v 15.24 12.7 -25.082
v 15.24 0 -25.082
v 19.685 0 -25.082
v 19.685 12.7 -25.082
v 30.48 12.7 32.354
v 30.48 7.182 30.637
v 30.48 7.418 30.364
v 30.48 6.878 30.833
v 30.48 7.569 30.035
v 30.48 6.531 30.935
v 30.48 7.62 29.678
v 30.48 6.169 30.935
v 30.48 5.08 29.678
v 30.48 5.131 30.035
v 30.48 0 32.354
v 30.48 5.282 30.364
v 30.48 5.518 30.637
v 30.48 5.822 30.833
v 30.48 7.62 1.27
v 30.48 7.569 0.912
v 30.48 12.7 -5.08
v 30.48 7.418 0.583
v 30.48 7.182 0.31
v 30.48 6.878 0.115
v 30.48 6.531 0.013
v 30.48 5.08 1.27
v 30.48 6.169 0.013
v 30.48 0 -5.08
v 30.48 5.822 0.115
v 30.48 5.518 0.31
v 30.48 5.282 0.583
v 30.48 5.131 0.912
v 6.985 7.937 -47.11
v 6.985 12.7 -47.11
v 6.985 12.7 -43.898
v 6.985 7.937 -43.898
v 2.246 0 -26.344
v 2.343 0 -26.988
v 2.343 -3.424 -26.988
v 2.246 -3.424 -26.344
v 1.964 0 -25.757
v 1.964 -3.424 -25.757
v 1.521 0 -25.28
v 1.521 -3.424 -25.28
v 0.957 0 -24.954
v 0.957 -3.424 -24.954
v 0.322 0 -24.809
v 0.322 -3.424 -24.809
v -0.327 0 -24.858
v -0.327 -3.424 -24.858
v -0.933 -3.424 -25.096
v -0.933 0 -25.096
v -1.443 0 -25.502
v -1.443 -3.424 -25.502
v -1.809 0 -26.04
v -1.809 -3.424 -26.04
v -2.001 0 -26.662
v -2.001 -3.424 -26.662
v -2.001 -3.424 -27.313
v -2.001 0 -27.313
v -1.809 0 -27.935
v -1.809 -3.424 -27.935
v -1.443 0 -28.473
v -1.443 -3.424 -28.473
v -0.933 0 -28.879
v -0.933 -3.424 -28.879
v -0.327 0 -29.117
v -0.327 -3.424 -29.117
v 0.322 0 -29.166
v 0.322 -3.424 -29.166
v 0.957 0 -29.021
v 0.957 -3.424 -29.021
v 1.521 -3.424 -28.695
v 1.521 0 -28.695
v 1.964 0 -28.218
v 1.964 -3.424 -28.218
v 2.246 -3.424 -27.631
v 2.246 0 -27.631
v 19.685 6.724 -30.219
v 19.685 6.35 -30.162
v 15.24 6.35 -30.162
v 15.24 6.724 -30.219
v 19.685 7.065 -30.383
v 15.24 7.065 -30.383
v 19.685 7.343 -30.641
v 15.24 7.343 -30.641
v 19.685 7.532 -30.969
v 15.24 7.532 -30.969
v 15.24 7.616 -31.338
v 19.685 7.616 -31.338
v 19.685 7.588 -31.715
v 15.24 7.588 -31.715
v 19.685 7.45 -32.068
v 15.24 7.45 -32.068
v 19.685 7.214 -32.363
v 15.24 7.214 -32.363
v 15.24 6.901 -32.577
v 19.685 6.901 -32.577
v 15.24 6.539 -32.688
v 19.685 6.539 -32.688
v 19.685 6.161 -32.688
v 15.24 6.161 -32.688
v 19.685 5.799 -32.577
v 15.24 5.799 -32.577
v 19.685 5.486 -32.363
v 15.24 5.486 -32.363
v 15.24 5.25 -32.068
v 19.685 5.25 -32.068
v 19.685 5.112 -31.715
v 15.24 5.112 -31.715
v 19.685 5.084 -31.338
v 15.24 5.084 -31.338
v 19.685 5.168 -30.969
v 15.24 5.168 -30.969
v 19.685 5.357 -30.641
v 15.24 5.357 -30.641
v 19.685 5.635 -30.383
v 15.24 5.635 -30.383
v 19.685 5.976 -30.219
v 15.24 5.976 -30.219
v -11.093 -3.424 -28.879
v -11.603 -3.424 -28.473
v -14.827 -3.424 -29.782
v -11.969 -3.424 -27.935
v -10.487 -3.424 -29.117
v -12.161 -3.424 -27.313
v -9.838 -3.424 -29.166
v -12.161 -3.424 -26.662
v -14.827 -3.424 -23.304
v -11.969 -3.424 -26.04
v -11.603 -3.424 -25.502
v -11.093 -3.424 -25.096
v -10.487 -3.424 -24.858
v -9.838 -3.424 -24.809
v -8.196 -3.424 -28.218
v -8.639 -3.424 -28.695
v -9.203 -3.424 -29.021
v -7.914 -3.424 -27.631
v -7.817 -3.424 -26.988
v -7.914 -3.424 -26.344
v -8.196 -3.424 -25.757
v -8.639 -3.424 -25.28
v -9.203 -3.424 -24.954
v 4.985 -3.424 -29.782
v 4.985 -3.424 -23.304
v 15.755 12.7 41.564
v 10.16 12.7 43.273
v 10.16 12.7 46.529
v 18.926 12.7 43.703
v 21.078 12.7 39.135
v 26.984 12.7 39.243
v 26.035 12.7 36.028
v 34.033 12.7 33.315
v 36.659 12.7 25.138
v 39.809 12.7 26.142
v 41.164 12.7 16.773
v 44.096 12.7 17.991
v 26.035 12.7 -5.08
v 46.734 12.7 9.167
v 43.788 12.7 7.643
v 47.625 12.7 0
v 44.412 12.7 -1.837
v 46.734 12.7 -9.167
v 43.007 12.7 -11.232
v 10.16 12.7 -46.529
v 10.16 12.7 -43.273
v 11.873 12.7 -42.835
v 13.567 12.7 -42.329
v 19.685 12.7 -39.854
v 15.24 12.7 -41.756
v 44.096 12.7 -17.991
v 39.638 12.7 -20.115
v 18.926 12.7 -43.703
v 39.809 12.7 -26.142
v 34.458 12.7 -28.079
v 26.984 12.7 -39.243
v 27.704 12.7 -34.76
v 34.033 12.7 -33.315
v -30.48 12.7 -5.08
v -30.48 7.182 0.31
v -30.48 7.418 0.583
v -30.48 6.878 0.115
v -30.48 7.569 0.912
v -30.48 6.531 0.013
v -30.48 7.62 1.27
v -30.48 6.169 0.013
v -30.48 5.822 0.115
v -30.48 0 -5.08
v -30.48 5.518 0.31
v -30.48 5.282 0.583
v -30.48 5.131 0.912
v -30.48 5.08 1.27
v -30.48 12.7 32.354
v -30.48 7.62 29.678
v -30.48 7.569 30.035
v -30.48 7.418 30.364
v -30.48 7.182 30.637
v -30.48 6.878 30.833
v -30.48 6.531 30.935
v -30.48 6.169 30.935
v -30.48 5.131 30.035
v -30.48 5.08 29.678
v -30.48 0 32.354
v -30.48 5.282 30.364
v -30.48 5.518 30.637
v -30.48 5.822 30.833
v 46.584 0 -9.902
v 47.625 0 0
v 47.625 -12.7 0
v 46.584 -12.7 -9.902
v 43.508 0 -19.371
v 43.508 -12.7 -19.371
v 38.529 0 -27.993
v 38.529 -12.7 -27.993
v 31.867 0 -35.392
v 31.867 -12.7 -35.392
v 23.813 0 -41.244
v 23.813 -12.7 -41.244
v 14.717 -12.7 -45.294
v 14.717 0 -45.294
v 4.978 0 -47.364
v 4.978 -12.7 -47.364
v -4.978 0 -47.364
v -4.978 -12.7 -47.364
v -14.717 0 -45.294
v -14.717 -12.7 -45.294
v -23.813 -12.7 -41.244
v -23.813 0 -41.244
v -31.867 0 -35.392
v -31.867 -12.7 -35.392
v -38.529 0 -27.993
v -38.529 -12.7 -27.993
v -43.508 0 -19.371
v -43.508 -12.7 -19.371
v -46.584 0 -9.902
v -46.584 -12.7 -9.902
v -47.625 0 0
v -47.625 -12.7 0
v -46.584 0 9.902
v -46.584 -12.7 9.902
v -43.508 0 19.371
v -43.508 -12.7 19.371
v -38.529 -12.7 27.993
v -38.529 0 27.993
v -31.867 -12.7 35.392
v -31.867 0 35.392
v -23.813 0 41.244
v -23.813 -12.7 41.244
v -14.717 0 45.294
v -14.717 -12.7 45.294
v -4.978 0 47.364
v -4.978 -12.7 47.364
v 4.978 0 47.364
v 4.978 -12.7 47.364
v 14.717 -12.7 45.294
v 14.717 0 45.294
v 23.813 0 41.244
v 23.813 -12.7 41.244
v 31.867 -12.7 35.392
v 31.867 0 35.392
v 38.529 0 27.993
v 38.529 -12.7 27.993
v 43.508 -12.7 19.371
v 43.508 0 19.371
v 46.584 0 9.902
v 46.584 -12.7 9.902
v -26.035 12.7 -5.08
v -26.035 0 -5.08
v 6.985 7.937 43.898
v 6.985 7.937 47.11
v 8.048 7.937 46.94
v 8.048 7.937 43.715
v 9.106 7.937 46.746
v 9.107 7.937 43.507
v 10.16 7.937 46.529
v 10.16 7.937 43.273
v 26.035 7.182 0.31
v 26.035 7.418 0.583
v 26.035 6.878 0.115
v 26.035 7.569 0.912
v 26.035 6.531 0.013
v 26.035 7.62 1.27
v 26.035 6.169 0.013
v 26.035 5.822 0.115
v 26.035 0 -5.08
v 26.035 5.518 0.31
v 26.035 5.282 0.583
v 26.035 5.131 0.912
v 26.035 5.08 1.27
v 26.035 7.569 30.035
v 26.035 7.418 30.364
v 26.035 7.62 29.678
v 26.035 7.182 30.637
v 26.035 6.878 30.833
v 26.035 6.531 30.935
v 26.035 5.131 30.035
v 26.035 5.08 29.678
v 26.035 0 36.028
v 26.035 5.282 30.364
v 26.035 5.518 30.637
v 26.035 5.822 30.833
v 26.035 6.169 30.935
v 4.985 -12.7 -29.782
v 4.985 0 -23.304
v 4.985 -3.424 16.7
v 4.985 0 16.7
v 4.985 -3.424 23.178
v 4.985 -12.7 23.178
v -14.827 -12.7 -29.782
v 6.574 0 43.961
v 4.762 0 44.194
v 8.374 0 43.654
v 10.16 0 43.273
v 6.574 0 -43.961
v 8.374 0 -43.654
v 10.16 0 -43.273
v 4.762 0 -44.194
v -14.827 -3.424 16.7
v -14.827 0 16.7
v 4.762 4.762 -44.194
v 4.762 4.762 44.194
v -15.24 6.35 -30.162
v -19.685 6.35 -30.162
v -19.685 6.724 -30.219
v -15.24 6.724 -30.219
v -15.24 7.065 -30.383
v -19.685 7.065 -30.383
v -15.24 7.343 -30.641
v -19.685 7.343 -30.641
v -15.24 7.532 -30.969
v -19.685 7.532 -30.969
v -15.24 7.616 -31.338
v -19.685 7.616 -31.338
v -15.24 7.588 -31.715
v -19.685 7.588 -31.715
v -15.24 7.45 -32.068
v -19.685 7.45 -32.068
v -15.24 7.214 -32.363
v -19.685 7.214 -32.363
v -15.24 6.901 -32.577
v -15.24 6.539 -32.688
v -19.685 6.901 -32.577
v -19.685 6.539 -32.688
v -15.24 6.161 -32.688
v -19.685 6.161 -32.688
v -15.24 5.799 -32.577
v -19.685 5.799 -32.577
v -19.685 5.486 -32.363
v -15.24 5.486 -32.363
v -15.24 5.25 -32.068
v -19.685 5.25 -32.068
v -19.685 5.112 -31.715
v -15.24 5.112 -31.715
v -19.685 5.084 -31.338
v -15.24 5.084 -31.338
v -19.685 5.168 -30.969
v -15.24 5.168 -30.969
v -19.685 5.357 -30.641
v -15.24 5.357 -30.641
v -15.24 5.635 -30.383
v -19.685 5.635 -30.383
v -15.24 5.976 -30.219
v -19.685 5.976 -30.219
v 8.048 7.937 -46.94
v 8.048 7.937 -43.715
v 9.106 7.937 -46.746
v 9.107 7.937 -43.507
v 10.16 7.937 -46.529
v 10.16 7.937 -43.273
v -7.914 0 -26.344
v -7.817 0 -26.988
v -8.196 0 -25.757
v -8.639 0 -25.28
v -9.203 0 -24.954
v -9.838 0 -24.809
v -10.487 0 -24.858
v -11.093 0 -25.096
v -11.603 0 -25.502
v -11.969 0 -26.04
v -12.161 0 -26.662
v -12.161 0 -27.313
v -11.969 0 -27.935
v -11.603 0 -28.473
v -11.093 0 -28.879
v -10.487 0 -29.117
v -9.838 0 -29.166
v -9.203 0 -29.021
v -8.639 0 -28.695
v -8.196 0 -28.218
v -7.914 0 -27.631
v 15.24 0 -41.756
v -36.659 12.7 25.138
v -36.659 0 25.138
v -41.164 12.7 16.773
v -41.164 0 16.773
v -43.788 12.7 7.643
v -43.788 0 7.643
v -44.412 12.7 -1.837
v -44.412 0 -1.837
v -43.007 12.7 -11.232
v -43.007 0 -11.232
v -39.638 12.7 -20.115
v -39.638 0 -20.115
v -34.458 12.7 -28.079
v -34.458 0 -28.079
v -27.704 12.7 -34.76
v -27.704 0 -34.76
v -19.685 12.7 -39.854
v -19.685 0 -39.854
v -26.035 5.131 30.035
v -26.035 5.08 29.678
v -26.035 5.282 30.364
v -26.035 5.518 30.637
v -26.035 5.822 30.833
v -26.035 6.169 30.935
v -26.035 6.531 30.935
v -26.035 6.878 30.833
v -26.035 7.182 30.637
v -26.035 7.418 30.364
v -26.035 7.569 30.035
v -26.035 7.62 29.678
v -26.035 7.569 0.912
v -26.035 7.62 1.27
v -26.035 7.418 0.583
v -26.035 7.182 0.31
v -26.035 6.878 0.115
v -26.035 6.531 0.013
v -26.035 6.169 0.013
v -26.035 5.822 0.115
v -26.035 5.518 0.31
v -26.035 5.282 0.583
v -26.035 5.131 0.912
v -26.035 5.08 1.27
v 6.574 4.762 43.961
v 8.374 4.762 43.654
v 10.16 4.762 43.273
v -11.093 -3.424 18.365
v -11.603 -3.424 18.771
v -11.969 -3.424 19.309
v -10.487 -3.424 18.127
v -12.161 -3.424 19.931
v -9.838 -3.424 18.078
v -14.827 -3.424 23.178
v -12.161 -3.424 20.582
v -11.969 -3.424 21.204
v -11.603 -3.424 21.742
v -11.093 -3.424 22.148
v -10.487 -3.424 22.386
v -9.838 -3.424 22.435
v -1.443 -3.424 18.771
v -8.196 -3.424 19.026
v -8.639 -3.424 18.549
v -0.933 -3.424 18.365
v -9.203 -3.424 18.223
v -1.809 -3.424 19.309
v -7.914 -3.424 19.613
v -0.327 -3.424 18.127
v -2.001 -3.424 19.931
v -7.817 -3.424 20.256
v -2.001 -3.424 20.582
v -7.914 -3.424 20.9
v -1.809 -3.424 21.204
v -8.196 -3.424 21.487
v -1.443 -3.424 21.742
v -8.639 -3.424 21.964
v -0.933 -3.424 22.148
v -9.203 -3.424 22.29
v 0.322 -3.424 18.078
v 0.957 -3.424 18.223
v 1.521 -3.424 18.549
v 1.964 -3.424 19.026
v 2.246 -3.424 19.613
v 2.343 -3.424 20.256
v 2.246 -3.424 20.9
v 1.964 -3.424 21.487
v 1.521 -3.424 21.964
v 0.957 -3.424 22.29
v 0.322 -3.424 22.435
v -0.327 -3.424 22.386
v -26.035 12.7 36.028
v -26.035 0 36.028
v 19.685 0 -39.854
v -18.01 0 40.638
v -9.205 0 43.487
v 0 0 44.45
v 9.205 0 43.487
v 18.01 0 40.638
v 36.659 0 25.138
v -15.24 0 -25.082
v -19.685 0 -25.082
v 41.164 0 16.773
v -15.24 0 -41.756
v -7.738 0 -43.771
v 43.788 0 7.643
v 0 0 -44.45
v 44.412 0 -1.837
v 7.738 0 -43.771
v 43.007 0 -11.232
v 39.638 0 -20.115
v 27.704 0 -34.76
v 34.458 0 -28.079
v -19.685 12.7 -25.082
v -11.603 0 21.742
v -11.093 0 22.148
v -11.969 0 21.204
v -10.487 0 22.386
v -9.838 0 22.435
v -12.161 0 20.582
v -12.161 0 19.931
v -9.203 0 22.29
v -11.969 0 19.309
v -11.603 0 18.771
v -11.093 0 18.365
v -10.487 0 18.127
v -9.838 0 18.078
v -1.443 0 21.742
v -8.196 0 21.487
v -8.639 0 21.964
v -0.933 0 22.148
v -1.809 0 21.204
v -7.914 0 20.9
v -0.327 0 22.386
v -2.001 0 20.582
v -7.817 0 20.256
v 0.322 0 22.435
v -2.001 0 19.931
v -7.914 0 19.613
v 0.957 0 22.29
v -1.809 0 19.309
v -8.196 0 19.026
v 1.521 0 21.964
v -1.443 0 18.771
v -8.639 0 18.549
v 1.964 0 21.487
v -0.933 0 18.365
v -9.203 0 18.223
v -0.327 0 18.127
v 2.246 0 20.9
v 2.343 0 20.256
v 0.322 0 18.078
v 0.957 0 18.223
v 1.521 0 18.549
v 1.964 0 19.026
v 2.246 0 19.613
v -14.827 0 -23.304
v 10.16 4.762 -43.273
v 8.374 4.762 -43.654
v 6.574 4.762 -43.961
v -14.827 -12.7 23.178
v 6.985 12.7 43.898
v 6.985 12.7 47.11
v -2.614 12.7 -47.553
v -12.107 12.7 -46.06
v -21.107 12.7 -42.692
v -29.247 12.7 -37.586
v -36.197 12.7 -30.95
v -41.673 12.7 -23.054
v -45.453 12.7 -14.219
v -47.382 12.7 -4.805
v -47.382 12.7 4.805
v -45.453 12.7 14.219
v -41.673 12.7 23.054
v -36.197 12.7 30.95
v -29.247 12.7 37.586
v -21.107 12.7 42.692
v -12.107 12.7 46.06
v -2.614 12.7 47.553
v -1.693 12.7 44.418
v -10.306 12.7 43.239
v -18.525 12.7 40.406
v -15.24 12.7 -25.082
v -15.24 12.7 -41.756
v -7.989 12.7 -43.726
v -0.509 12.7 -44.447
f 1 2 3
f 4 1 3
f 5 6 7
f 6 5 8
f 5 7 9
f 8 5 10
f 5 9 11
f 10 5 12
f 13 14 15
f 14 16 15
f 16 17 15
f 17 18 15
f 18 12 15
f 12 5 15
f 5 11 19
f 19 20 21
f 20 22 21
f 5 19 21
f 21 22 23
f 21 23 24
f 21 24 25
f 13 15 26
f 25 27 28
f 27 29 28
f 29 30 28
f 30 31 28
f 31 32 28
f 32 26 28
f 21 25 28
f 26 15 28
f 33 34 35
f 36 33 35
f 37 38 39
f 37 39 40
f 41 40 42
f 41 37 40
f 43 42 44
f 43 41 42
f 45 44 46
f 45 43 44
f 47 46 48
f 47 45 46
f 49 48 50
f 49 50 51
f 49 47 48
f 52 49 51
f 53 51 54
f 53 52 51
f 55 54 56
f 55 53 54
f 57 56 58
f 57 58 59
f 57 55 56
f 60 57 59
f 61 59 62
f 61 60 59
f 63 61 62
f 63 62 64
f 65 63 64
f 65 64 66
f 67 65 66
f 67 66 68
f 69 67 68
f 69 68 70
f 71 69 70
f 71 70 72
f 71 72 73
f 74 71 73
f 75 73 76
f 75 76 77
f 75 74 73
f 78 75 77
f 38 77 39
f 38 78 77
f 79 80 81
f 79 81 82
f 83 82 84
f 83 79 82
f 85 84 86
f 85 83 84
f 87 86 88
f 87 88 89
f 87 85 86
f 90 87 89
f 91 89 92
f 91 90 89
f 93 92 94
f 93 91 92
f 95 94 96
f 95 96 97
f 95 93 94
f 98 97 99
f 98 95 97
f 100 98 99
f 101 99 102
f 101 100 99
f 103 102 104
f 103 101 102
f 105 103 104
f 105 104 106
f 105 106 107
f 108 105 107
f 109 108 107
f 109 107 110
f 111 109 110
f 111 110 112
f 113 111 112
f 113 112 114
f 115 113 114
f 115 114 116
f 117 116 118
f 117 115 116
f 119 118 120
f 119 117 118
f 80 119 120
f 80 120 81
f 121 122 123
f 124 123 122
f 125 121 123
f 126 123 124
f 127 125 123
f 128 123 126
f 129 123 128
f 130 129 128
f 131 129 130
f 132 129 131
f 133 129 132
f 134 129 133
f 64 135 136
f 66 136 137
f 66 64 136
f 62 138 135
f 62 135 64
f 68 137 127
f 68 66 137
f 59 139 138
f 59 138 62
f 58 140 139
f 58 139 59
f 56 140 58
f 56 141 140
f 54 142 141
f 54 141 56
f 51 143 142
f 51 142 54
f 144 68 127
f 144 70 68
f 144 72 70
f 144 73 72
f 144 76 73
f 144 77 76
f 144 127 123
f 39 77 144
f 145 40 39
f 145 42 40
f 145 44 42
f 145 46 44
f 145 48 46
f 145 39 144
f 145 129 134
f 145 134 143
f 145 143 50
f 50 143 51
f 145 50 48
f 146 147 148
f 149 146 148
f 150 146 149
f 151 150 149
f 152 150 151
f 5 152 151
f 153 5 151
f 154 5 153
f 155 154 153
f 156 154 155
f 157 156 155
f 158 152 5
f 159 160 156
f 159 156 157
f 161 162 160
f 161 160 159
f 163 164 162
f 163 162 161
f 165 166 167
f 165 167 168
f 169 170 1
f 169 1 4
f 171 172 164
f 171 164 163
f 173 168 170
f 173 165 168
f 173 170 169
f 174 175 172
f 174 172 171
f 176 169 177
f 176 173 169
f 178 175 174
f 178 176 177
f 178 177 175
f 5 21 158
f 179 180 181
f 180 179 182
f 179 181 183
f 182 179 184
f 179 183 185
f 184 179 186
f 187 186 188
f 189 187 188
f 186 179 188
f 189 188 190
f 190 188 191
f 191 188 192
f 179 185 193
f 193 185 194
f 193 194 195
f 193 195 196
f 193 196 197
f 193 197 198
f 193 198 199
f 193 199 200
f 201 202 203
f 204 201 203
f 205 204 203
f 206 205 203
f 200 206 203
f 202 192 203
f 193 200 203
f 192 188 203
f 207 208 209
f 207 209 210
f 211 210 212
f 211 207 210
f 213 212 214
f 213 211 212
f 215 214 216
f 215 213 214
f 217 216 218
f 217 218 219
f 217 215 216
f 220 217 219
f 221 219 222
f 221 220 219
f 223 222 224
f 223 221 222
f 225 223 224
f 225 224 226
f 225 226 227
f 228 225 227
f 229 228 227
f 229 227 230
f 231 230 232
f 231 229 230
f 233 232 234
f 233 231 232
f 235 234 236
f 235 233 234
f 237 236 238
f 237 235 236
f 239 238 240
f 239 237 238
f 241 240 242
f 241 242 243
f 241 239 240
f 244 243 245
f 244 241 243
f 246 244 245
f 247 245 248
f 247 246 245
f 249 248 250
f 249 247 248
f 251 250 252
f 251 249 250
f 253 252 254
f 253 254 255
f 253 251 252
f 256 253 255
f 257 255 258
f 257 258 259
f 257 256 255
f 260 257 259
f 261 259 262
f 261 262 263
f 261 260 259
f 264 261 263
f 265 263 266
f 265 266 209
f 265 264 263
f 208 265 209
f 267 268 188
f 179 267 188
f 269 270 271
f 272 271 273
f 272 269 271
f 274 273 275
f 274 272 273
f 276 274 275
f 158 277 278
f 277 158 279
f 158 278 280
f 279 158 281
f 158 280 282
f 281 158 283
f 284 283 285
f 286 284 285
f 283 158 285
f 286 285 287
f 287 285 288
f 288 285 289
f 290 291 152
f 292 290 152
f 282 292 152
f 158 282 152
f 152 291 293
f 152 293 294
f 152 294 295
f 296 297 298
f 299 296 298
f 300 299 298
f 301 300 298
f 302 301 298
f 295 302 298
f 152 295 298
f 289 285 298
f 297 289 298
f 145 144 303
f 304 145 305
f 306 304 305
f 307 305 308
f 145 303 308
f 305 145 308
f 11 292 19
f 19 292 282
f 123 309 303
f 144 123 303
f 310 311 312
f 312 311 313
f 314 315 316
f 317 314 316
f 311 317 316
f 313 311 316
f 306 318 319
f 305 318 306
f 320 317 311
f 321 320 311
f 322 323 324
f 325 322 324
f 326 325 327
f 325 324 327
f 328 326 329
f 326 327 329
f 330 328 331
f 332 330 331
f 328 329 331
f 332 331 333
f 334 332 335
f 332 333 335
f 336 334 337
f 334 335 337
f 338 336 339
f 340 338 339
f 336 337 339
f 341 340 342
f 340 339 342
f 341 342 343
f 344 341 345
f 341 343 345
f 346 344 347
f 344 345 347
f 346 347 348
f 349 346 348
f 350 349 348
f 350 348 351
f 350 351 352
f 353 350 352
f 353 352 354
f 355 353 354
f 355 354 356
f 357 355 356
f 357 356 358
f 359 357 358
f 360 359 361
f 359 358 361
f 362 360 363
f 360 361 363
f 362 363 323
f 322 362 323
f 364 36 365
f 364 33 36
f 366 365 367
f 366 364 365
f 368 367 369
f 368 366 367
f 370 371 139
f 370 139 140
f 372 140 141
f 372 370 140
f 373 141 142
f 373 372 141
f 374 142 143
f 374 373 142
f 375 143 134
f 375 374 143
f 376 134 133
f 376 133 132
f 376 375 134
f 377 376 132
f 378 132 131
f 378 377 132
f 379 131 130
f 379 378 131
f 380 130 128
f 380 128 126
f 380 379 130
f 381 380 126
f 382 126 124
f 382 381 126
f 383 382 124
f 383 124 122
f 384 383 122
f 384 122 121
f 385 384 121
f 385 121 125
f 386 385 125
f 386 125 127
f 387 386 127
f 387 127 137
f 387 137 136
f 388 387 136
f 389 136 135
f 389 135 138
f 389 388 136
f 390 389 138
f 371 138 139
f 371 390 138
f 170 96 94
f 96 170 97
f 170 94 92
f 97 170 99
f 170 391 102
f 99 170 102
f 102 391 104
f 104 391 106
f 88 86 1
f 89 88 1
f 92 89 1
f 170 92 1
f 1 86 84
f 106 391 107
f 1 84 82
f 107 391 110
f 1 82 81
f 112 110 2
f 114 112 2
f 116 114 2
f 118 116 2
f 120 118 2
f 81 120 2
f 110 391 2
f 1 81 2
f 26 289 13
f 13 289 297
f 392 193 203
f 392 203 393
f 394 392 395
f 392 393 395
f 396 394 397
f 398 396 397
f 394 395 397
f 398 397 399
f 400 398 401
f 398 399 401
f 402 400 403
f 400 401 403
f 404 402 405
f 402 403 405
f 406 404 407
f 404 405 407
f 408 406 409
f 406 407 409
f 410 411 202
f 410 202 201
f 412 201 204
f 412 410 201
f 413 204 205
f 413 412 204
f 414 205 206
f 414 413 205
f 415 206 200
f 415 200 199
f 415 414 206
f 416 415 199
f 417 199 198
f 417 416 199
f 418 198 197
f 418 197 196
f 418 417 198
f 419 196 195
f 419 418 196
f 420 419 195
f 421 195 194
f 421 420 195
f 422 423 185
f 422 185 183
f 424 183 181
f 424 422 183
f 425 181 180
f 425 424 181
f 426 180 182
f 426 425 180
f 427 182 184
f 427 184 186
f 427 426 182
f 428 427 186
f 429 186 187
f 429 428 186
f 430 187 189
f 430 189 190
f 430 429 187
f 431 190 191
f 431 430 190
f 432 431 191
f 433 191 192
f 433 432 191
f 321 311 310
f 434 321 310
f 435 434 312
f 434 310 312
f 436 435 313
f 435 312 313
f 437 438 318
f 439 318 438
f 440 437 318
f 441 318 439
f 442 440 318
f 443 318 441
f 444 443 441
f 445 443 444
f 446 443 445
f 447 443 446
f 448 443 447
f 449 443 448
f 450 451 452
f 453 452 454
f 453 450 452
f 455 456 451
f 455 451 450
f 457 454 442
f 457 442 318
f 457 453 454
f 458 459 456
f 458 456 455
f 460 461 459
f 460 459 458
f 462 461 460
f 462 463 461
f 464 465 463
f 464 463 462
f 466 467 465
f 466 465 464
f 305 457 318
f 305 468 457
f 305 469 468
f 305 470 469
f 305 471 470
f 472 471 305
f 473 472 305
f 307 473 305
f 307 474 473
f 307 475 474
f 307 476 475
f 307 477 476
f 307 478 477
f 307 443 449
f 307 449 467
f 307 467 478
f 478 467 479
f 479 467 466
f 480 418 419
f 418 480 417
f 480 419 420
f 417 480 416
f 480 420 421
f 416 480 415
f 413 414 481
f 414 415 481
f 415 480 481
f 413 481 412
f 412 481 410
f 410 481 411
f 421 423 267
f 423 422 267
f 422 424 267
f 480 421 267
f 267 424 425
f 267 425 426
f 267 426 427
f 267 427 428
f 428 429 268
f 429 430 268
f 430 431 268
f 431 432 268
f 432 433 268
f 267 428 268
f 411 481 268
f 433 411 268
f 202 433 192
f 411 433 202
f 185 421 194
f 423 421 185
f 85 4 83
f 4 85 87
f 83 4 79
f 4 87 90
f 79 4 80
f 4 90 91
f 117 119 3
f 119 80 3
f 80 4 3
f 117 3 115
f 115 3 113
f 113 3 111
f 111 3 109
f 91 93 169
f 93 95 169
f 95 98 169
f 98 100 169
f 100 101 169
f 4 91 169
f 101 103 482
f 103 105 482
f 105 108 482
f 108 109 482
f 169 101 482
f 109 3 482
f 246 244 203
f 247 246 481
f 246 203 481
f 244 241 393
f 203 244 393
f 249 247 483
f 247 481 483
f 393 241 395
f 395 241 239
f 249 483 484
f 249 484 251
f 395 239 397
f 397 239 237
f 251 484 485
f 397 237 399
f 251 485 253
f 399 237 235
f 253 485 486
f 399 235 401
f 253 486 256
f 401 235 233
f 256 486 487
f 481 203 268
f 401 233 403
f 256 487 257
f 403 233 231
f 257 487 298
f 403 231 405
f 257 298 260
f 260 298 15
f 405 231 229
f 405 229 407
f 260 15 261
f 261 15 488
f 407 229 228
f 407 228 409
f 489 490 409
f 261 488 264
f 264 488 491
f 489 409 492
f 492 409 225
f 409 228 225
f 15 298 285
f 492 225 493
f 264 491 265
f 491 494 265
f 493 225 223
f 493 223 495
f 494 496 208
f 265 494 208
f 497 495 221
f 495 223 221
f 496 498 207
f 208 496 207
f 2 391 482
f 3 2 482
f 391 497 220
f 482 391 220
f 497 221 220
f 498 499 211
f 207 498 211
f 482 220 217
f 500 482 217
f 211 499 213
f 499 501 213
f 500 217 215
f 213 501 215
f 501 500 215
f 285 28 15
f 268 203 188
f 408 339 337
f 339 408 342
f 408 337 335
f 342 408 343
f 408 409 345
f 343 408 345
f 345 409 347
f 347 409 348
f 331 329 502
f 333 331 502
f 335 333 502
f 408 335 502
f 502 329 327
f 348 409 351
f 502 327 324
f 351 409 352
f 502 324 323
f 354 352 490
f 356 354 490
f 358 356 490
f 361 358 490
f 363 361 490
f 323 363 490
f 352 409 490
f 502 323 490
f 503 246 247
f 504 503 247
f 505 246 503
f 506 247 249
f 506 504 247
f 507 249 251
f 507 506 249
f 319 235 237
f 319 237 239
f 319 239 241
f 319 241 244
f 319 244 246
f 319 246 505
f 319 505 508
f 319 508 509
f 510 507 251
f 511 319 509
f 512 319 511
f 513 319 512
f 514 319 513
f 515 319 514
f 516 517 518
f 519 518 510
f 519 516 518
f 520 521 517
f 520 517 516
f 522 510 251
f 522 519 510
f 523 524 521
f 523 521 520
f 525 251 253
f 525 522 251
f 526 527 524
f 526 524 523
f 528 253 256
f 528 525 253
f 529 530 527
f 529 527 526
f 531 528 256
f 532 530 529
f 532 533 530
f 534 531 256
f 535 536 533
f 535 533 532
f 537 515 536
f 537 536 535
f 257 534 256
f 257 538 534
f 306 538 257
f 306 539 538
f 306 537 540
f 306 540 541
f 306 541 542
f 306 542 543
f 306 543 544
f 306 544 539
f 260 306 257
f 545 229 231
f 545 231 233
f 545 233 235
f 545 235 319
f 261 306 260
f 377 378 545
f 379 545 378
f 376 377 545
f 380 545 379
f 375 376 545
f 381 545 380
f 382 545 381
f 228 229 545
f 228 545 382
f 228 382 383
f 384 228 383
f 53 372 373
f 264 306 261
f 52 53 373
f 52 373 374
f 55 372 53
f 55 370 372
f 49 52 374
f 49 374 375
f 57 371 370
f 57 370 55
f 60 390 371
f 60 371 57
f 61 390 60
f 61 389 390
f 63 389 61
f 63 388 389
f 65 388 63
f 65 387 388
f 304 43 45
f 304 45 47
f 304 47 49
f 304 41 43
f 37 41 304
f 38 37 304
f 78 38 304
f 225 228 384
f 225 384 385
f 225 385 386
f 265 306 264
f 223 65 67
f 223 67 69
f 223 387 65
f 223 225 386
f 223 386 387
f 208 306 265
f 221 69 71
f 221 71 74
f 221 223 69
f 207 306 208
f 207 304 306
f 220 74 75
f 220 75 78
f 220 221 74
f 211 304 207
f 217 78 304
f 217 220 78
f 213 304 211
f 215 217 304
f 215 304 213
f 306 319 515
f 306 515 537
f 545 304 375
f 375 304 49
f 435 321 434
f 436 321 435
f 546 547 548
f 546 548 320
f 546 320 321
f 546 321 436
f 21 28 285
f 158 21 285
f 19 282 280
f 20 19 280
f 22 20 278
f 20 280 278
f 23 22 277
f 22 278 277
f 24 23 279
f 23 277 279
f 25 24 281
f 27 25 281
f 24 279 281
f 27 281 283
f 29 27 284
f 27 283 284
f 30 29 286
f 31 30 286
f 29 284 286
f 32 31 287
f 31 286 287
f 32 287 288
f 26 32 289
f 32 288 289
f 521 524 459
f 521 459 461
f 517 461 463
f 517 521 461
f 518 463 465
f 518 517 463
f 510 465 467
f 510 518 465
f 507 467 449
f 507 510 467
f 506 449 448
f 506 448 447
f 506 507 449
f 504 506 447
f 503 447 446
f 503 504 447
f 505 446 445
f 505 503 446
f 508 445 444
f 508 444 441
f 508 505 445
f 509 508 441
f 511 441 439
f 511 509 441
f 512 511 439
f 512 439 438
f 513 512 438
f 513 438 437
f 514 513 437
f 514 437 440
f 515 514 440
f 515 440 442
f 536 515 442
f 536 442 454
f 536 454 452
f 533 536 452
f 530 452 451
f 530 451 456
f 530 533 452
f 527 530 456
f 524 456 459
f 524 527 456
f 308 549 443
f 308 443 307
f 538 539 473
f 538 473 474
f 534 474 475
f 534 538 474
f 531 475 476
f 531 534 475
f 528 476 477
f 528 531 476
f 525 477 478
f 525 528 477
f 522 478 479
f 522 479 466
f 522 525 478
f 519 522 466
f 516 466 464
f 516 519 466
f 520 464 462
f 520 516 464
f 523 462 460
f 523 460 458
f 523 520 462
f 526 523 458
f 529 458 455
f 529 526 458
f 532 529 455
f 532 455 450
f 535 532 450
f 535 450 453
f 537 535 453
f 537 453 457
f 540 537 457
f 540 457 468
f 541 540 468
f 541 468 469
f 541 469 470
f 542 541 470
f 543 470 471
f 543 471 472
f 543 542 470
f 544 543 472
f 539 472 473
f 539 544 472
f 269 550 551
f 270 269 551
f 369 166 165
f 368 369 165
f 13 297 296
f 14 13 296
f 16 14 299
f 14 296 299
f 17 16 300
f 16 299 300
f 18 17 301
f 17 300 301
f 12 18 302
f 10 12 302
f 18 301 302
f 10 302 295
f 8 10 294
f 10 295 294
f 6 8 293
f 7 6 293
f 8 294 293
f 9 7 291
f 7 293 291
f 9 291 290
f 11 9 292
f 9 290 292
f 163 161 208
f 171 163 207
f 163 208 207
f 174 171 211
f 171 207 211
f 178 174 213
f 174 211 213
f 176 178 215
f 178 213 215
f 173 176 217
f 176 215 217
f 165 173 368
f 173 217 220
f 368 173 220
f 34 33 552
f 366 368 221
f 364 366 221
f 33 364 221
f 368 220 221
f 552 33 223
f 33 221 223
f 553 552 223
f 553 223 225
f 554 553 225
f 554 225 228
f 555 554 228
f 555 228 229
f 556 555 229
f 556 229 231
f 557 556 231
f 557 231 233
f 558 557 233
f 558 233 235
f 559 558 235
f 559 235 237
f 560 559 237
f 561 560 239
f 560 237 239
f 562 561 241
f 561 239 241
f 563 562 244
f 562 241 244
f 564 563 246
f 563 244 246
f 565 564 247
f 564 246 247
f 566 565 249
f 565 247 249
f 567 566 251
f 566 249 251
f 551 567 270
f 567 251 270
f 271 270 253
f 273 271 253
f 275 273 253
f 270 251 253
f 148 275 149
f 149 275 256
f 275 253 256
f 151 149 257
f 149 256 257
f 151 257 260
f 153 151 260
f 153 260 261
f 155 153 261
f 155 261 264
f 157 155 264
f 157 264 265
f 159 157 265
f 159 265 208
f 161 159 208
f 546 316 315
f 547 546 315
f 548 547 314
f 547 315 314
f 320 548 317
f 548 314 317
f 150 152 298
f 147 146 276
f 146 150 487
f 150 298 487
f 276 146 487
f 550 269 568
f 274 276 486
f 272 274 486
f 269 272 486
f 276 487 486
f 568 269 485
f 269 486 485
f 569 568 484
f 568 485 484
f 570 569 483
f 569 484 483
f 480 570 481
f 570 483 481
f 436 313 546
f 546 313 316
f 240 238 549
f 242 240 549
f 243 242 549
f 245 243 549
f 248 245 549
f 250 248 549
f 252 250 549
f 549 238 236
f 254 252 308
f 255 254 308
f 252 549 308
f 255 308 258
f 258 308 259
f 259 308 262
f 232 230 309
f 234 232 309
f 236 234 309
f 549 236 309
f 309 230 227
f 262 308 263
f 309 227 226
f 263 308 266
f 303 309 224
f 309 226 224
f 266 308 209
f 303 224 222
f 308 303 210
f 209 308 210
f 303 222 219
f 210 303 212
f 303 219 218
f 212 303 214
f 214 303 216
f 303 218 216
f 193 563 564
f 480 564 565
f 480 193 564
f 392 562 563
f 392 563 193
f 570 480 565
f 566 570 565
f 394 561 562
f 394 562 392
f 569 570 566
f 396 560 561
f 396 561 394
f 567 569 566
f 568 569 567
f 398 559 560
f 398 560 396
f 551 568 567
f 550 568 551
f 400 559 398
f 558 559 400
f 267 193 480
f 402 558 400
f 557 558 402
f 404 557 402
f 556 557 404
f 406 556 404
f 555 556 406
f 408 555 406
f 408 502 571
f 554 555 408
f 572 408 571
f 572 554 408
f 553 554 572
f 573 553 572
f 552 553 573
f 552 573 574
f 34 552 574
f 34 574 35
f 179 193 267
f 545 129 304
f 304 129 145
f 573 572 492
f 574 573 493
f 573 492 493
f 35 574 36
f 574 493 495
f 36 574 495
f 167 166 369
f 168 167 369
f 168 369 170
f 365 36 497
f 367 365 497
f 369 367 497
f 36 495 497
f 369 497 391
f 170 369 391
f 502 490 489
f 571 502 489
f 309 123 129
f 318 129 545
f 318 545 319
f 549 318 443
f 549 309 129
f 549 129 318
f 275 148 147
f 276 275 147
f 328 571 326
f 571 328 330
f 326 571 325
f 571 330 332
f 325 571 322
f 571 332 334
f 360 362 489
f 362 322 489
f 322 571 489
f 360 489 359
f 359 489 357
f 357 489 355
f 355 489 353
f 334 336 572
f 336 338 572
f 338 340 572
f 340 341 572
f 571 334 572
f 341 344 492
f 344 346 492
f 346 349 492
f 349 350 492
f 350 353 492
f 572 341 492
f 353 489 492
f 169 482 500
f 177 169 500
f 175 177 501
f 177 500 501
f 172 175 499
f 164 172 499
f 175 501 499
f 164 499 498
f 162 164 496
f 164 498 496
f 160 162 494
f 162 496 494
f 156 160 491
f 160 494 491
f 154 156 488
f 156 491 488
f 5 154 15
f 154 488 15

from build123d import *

# Parameters (mm, degrees)
SKETCH1_R           = 47.625
BOSS_EXTRUDE1_DEPTH = 12.7
SKETCH2_R           = 47.625
BOSS_EXTRUDE4_DEPTH = 12.7
CUT_EXTRUDE8_START  = -34.925
SKETCH8_R           = 1.27
CUT_EXTRUDE8_DEPTH  = 4.445
CUT_EXTRUDE15_DEPTH = 4.445
BOSS_EXTRUDE5_DEPTH = 4.7625
CUT_EXTRUDE10_DEPTH = 4.7625
SKETCH14_W          = 19.812
SKETCH14_H          = 52.959
CUT_EXTRUDE11_DEPTH = 9.275815586
SKETCH15_W          = 19.812
SKETCH15_H          = 40.005
CUT_EXTRUDE12_DEPTH = 8.186684
CUT_EXTRUDE13_START = -3.424185
SKETCH16_R          = 2.1844
CUT_EXTRUDE13_DEPTH = 3.424185


with BuildPart() as part:
    # Sketch1 → Boss-Extrude1 (new body)
    with BuildSketch(Plane(origin=(0, 0, 0), x_dir=(1, 0, 0), z_dir=(0, 1, 0))):
        Circle(SKETCH1_R)
    extrude(amount=-BOSS_EXTRUDE1_DEPTH)

    # Sketch14 → Cut-Extrude11 (cut)
    with BuildSketch(Plane.XZ.offset(12.7)):
        with Locations((-4.92125, -3.302)):
            Rectangle(SKETCH14_W, SKETCH14_H)
    extrude(amount=-CUT_EXTRUDE11_DEPTH, mode=Mode.SUBTRACT)

    # Sketch15 → Cut-Extrude12 (cut)
    with BuildSketch(Plane.XZ.offset(3.424184414)):
        with Locations((-4.92125, -3.302)):
            Rectangle(SKETCH15_W, SKETCH15_H)
    extrude(amount=-CUT_EXTRUDE12_DEPTH, mode=Mode.SUBTRACT)

    # Sketch16 → Cut-Extrude13 (cut)
    with BuildSketch(Plane.XZ.offset(3.424184414).offset(CUT_EXTRUDE13_START)):
        with Locations((-10.00125, -26.9875)):
            Circle(SKETCH16_R)
        with Locations((0.15875, -26.9875)):
            Circle(SKETCH16_R)
        with Locations((-10.00125, 20.2565)):
            Circle(SKETCH16_R)
        with Locations((0.15875, 20.2565)):
            Circle(SKETCH16_R)
    extrude(amount=CUT_EXTRUDE13_DEPTH, mode=Mode.SUBTRACT)


with BuildPart() as body_2:
    # Sketch2 → Boss-Extrude4 (new body)
    with BuildSketch(Plane(origin=(0, 0, 0), x_dir=(1, 0, 0), z_dir=(0, 1, 0))):
        Circle(SKETCH2_R)
        with BuildLine():
            Line((30.48, 5.08), (26.035, 5.08))
            Line((26.035, 5.08), (26.035, -36.027507199))
            ThreePointArc((26.035, -36.027507199), (0, -44.45), (-26.035, -36.027507199))
            Line((-26.035, -36.027507199), (-26.035, 5.08))
            Line((-26.035, 5.08), (-30.48, 5.08))
            Line((-30.48, 5.08), (-30.48, -32.353857575))
            ThreePointArc((-30.48, -32.353857575), (-43.961440483, 6.572233308), (-19.685, 39.853522743))
            Line((-19.685, 39.853522743), (-19.685, 25.0825))
            Line((-19.685, 25.0825), (-15.24, 25.0825))
            Line((-15.24, 25.0825), (-15.24, 41.755776846))
            ThreePointArc((-15.24, 41.755776846), (0, 44.45), (15.24, 41.755776846))
            Line((15.24, 41.755776846), (15.24, 25.0825))
            Line((15.24, 25.0825), (19.685, 25.0825))
            Line((19.685, 25.0825), (19.685, 39.853522743))
            ThreePointArc((19.685, 39.853522743), (43.961440483, 6.572233308), (30.48, -32.353857575))
            Line((30.48, -32.353857575), (30.48, 5.08))
        make_face(mode=Mode.SUBTRACT)
    extrude(amount=BOSS_EXTRUDE4_DEPTH)

    # Sketch8 → Cut-Extrude8 (cut)
    with BuildSketch(Plane.ZY.offset(15.24).offset(CUT_EXTRUDE8_START)):
        with Locations((-31.4325, 6.35)):
            Circle(SKETCH8_R)
    cut_extrude8 = extrude(amount=CUT_EXTRUDE8_DEPTH, mode=Mode.SUBTRACT)

    # Sketch17 → Cut-Extrude15 (cut)
    with BuildSketch(Plane(origin=(-26.035, 0, 0), x_dir=(0, 0, -1), z_dir=(1, 0, 0))):
        with BuildLine():
            Line((-29.677507199, 7.62), (-1.27, 7.62))
            ThreePointArc((-1.27, 7.62), (0, 6.35), (-1.27, 5.08))
            Line((-1.27, 5.08), (-29.677507199, 5.08))
            ThreePointArc((-29.677507199, 5.08), (-30.947507199, 6.35), (-29.677507199, 7.62))
        make_face()
    cut_extrude15 = extrude(amount=-CUT_EXTRUDE15_DEPTH, mode=Mode.SUBTRACT)

    # Mirror4: Cut-Extrude8, Cut-Extrude15 across plane
    add(cut_extrude8.mirror(Plane(origin=(0, 0, 0), x_dir=(0, 0, 1), z_dir=(1, 0, 0))), mode=Mode.SUBTRACT)
    add(cut_extrude15.mirror(Plane(origin=(0, 0, 0), x_dir=(0, 0, 1), z_dir=(1, 0, 0))), mode=Mode.SUBTRACT)

    # Sketch12 → Cut-Extrude10 (cut)
    with BuildSketch(Plane(origin=(0, 12.7, 0), x_dir=(1, 0, 0), z_dir=(0, 1, 0))):
        with BuildLine():
            Line((10.16, -46.528647358), (10.16, 46.528647358))
            ThreePointArc((10.16, 46.528647358), (8.577426405, 46.846220565), (6.985, 47.109981957))
            Line((6.985, 47.109981957), (6.985, -47.109981957))
            ThreePointArc((6.985, -47.109981957), (8.577426405, -46.846220565), (10.16, -46.528647358))
        make_face()
    extrude(amount=-CUT_EXTRUDE10_DEPTH, mode=Mode.SUBTRACT)


with BuildPart() as body_3:
    # Sketch10 → Boss-Extrude5 (new body)
    with BuildSketch(Plane(origin=(0, 0, 0), x_dir=(1, 0, 0), z_dir=(0, 1, 0))):
        with BuildLine():
            ThreePointArc((4.7625, -44.19412963), (7.475442585, -43.816894666), (10.16, -43.273281595))
            Line((10.16, -43.273281595), (10.16, 43.273281595))
            ThreePointArc((10.16, 43.273281595), (7.475442585, 43.816894666), (4.7625, 44.19412963))
            Line((4.7625, 44.19412963), (4.7625, -44.19412963))
        make_face()
    extrude(amount=BOSS_EXTRUDE5_DEPTH)


solid = Compound([part.part, body_2.part, body_3.part])
